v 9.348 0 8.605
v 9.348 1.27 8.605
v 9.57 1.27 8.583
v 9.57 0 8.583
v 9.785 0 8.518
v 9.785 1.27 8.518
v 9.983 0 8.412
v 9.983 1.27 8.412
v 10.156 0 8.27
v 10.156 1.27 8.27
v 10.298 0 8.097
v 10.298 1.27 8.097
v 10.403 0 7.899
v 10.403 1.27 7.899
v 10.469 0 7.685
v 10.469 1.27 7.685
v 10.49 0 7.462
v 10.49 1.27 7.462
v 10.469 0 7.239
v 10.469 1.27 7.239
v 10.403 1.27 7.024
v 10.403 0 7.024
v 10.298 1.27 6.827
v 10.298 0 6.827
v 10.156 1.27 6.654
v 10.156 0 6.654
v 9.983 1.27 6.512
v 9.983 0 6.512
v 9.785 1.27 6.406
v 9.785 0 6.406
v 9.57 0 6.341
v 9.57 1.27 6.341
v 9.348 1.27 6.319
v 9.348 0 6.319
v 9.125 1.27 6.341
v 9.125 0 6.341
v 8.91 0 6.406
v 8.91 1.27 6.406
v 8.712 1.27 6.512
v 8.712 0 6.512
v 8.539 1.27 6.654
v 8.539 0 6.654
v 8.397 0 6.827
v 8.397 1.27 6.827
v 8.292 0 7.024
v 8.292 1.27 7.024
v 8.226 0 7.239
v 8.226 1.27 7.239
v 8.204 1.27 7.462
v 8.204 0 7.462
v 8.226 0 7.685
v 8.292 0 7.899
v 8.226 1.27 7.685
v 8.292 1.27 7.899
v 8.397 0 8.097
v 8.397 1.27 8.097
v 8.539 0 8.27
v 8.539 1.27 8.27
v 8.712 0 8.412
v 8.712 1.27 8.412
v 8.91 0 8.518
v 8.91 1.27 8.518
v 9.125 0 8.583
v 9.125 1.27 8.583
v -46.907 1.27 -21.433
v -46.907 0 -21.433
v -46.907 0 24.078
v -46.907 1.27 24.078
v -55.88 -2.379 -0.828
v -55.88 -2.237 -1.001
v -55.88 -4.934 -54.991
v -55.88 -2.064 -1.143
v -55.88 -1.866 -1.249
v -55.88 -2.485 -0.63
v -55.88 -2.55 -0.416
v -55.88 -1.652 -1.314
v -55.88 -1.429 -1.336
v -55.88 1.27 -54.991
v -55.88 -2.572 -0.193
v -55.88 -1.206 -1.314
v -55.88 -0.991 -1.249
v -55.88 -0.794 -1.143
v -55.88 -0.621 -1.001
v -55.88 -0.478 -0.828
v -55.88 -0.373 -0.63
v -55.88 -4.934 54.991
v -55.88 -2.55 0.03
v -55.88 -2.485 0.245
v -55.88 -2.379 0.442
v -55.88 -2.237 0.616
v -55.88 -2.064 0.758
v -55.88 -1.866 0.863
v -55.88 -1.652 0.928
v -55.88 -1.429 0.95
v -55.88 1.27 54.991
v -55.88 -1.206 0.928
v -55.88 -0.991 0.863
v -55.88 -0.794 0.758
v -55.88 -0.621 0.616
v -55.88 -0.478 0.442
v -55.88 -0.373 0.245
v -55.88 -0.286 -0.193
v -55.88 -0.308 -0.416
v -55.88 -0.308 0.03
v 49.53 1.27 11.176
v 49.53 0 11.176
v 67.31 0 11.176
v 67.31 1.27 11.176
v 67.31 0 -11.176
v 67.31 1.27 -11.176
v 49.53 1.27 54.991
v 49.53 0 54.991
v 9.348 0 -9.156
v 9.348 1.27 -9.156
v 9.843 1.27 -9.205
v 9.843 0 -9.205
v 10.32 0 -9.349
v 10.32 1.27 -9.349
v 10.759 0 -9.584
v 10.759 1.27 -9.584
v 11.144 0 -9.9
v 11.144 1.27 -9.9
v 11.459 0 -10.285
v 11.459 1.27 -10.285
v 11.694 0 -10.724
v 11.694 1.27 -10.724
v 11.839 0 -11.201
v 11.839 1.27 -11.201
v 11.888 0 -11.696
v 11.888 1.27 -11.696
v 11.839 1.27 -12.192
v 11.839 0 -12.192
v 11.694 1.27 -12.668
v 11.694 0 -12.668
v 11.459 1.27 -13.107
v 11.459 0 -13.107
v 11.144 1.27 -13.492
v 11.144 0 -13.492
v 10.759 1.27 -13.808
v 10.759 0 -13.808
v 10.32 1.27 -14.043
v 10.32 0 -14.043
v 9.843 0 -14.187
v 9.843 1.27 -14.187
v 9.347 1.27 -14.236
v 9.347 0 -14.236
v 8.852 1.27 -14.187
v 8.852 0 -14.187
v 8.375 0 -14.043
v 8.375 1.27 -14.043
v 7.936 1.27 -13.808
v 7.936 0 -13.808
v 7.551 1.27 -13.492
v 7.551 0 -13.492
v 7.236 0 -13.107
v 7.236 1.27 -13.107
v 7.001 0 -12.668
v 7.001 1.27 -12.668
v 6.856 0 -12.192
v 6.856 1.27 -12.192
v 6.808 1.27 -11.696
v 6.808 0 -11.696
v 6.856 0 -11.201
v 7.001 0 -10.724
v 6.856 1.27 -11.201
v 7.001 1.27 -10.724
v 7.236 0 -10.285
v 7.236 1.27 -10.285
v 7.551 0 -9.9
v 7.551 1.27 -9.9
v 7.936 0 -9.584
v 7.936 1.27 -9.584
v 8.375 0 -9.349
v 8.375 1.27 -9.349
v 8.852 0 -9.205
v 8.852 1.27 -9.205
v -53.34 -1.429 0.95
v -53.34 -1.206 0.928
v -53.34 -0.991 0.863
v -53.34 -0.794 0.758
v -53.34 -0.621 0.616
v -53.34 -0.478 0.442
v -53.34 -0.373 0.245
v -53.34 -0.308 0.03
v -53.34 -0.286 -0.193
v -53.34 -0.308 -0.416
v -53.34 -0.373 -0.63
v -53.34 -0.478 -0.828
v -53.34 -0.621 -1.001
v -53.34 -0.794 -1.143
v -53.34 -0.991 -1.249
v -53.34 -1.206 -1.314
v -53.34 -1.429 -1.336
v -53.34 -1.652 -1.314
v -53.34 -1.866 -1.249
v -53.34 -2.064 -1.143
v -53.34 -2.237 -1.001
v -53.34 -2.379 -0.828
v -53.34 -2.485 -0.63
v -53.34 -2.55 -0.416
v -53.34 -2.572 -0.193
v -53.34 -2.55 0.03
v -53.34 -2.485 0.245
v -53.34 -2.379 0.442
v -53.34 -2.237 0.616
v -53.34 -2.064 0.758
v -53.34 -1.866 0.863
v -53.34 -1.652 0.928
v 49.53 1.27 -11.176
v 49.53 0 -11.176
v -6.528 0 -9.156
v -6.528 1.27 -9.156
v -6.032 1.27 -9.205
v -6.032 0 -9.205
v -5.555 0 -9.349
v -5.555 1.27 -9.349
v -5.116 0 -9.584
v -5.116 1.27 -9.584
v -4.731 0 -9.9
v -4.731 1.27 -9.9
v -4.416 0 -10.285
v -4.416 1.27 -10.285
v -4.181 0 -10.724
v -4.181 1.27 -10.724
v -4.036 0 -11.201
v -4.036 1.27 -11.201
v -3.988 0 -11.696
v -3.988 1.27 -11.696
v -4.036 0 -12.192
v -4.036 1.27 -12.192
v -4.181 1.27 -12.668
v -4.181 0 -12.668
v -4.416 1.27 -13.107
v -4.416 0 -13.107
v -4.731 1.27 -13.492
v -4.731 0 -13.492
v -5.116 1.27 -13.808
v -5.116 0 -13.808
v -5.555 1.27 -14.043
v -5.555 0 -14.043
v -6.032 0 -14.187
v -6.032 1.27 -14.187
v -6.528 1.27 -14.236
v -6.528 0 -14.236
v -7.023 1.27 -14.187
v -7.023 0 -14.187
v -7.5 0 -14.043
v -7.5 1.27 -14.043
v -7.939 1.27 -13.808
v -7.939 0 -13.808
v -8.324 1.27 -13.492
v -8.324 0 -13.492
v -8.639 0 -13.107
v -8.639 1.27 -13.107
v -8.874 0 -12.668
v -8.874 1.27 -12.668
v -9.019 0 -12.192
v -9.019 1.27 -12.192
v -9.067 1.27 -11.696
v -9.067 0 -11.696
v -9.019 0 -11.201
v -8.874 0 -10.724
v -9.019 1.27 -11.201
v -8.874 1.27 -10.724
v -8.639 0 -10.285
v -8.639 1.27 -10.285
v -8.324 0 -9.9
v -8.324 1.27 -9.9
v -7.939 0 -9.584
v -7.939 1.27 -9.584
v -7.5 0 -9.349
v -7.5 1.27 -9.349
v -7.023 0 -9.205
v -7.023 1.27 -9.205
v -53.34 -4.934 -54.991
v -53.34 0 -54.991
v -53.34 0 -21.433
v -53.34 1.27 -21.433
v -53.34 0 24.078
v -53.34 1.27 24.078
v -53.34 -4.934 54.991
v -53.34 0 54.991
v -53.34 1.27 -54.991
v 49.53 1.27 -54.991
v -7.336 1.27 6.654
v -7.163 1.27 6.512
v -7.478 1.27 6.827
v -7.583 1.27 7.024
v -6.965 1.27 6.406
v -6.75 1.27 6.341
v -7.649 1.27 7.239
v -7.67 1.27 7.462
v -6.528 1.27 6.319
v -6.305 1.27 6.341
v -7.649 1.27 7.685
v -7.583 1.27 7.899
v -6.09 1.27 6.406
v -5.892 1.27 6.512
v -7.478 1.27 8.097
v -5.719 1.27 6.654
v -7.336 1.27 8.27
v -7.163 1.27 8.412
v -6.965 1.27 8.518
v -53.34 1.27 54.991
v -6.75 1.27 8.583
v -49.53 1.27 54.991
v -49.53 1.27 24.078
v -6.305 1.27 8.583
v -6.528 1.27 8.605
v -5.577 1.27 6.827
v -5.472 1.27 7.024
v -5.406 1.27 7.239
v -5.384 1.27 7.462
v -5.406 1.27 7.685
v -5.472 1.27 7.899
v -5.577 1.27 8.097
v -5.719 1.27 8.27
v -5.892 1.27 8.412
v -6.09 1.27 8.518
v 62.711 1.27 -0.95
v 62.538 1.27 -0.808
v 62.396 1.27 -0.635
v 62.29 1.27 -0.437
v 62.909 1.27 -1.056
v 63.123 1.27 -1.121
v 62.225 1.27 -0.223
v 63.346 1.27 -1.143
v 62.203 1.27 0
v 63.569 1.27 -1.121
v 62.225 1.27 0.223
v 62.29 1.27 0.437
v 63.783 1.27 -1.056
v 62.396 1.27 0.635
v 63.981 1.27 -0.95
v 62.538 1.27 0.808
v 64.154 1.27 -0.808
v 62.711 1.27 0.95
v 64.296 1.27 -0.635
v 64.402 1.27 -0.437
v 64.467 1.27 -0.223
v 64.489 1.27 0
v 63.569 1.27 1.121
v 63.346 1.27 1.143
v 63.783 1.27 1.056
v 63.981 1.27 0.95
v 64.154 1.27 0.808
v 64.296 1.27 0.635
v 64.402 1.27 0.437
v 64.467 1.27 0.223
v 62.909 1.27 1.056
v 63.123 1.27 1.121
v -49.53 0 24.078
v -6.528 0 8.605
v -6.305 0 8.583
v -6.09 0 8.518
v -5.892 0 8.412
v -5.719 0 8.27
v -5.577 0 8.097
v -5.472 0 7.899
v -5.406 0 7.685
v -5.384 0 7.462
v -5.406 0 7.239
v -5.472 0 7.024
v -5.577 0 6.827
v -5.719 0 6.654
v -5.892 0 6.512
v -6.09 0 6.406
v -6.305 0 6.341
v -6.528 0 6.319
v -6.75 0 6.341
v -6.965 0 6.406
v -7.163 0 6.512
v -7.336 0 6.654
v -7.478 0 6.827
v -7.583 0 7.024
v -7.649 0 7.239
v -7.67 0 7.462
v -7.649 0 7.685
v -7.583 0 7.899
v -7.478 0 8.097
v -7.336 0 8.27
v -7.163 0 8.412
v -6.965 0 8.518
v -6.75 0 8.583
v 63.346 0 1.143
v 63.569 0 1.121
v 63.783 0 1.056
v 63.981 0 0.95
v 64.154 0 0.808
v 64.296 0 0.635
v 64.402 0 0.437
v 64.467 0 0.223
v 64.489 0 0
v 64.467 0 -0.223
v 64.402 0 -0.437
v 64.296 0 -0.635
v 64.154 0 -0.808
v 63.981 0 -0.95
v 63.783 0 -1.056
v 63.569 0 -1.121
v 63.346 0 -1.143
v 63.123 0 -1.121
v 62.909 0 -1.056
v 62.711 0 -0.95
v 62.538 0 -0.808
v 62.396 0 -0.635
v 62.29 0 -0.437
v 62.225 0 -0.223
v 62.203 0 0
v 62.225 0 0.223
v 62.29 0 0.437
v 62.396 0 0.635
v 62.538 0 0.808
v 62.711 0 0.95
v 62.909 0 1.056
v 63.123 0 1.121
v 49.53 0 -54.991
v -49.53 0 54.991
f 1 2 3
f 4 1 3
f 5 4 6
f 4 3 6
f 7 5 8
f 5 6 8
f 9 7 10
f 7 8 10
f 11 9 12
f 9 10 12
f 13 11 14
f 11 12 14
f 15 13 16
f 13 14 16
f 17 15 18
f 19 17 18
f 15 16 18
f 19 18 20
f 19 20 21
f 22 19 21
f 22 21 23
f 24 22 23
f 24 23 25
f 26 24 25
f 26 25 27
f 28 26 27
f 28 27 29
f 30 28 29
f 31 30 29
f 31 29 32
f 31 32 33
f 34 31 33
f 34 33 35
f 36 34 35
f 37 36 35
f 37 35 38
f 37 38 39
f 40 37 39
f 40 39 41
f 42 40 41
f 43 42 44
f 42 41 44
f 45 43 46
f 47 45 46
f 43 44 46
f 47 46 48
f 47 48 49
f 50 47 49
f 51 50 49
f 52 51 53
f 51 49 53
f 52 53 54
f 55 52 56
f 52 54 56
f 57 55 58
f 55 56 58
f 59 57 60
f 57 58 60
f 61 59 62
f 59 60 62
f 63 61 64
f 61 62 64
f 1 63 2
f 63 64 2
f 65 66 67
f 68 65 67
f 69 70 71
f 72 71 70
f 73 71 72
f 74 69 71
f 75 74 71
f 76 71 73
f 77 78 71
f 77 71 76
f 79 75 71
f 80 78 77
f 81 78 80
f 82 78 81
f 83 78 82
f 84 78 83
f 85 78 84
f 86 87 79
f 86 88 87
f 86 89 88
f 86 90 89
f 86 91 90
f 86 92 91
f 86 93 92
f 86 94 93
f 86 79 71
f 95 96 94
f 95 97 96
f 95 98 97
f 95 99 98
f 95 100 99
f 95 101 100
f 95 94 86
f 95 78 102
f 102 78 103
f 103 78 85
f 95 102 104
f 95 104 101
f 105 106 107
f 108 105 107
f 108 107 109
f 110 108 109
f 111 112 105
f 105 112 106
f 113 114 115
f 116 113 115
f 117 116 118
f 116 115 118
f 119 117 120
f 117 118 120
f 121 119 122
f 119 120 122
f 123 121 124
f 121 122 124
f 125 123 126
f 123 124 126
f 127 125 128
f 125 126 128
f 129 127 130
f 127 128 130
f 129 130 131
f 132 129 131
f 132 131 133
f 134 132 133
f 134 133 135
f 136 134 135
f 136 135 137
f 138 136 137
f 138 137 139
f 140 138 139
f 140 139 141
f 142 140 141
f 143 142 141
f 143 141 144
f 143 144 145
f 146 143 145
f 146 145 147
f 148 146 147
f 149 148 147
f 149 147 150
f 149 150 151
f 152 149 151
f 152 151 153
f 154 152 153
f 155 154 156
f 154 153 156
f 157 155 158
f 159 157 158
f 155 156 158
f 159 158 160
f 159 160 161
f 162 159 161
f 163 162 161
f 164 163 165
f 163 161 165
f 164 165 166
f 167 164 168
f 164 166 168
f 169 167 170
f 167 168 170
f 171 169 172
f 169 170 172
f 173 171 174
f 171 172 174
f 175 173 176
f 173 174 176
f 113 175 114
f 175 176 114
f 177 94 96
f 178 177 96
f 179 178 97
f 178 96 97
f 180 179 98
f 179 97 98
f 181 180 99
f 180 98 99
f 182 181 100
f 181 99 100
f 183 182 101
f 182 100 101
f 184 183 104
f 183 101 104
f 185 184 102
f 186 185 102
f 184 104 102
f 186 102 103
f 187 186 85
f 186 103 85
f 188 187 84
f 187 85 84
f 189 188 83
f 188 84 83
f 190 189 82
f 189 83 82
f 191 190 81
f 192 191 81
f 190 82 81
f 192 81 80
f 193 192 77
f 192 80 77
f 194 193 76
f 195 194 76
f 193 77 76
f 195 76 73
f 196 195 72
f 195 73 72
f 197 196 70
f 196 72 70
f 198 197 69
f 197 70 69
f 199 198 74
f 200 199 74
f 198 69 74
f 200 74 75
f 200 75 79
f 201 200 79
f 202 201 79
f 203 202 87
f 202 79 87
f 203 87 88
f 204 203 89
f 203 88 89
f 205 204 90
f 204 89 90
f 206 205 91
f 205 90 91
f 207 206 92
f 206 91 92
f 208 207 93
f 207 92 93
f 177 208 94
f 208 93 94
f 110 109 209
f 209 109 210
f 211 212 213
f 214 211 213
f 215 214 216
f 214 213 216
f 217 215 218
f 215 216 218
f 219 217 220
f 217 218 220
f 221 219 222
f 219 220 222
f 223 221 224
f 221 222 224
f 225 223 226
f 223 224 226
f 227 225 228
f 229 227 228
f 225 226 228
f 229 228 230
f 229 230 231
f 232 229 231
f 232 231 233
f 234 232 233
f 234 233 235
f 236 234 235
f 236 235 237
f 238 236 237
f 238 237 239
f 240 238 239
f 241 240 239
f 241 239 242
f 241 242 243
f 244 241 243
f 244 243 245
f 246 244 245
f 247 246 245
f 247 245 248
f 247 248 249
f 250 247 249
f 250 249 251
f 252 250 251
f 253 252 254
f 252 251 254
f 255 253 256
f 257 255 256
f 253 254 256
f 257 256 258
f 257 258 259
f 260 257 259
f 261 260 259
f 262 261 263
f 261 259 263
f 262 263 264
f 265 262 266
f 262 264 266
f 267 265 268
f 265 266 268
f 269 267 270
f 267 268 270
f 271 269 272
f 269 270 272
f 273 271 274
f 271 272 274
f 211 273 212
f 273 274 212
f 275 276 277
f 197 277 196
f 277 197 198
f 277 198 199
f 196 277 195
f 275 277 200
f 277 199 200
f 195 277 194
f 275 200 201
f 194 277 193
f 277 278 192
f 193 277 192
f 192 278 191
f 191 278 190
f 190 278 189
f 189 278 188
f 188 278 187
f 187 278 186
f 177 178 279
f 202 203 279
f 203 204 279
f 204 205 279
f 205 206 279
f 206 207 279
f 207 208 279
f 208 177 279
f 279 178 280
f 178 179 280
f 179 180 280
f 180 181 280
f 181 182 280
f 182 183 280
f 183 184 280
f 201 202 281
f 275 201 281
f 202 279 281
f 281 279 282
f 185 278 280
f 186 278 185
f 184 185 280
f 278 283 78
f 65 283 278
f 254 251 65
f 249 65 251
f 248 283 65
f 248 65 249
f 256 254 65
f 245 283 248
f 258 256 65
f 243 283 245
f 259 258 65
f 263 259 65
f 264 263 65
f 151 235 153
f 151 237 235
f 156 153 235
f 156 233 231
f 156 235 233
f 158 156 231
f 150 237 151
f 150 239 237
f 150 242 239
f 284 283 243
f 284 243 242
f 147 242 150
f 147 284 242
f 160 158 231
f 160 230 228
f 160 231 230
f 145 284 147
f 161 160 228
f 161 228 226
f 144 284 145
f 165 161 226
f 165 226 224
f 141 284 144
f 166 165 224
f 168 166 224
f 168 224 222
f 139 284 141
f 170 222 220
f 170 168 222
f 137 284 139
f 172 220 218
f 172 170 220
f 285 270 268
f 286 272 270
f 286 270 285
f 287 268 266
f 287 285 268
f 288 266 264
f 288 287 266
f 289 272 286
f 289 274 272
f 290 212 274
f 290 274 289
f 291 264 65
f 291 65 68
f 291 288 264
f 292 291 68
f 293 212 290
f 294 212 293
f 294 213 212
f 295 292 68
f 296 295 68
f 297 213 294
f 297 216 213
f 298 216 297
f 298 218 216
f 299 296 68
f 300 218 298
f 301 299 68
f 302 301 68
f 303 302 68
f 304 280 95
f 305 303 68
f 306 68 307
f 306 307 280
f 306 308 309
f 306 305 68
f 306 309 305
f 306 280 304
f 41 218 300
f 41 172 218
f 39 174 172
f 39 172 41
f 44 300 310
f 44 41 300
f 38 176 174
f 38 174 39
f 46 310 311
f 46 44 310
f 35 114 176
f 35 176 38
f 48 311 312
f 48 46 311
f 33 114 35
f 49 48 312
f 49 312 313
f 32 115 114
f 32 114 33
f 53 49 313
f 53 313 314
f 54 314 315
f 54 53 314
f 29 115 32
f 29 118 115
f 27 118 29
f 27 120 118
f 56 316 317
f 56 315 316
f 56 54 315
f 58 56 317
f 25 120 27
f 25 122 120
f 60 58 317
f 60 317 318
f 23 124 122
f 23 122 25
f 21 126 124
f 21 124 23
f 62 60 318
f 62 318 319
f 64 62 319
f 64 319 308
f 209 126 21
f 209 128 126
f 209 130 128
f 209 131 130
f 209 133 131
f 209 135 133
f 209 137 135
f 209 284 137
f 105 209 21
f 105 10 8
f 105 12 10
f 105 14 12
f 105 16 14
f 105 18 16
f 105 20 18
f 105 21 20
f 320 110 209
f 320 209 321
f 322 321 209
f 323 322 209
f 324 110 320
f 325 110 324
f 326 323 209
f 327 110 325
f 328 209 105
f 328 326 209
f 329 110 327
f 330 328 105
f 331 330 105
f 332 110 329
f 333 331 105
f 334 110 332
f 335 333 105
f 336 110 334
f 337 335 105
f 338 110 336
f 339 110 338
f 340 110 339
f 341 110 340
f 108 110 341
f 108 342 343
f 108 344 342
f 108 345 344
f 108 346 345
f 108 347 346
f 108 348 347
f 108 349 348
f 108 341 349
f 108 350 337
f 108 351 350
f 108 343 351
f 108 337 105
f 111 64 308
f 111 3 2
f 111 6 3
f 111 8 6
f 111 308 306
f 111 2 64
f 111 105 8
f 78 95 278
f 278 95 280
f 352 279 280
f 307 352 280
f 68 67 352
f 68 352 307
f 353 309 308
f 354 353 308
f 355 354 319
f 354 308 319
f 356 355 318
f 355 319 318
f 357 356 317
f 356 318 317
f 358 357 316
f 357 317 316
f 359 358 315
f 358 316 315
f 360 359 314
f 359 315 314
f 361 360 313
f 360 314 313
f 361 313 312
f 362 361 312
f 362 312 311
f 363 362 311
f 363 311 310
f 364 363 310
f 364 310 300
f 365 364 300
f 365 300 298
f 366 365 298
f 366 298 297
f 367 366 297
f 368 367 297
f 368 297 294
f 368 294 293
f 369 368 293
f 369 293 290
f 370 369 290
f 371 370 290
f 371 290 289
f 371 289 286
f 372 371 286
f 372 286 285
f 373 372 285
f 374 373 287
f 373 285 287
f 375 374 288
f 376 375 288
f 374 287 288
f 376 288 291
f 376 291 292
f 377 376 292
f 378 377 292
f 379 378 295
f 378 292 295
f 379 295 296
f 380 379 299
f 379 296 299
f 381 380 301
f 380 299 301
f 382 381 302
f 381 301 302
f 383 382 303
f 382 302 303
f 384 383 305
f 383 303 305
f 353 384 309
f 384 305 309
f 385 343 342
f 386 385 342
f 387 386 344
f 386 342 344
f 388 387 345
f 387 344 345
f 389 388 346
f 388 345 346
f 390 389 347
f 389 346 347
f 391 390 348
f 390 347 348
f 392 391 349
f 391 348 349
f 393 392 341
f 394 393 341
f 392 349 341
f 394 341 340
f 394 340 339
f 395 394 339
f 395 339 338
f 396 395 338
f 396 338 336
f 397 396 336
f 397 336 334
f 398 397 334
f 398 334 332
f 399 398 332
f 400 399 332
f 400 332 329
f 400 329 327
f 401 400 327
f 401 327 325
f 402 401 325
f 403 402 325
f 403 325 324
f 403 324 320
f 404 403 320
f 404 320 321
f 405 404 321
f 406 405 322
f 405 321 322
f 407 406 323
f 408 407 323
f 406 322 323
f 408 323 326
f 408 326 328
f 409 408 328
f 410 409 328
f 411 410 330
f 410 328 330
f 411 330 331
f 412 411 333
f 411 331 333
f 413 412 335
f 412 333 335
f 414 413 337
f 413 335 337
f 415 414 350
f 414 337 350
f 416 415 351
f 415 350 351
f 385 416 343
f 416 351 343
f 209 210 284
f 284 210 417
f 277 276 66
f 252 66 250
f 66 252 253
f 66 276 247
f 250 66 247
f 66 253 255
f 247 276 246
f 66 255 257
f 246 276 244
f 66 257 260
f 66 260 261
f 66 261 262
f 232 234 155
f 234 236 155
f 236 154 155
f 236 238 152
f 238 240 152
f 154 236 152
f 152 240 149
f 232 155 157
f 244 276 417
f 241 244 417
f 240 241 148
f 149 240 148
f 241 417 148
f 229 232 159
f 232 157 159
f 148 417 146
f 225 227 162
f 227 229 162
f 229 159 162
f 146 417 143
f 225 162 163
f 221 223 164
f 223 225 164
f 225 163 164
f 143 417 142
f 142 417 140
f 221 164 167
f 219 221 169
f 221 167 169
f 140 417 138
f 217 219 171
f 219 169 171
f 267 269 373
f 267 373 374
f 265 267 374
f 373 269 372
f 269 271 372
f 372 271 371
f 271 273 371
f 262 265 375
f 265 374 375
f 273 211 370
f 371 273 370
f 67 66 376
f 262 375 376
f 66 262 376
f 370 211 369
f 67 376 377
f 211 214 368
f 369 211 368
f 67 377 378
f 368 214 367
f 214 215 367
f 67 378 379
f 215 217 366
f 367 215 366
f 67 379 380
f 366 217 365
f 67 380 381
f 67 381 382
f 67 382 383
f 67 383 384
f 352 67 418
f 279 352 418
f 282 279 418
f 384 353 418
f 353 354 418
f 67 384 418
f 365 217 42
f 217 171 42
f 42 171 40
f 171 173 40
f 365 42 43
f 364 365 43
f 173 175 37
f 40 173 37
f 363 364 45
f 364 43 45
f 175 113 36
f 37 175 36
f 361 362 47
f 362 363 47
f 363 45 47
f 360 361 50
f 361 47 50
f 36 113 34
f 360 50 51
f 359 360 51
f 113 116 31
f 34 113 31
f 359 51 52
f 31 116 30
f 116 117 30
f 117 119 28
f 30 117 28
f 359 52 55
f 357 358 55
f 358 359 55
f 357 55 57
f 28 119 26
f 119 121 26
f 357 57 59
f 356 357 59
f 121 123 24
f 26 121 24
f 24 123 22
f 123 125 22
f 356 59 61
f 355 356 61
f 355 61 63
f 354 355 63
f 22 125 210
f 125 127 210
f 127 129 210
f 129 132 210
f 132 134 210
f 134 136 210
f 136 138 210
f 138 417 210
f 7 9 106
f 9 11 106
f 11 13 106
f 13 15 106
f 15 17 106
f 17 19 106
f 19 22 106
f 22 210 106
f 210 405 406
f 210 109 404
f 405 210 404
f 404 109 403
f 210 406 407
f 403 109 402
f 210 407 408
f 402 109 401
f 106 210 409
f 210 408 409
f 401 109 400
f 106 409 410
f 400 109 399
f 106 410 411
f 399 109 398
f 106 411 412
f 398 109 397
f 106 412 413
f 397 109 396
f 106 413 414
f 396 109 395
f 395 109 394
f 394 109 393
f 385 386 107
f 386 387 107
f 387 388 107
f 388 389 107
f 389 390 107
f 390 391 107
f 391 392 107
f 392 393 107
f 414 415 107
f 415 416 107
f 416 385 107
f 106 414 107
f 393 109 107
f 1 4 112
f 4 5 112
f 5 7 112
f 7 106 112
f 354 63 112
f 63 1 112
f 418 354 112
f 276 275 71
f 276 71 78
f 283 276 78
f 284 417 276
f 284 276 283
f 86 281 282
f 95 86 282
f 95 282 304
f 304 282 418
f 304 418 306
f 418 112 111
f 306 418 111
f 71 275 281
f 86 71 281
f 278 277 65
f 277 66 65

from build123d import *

# Parameters (mm, degrees)
BOSS_EXTRUDE1_DEPTH = 1.27
SKETCH2_R           = 1.143
CUT_EXTRUDE2_DEPTH  = 2.54
SKETCH3_R           = 2.54
SKETCH3_R_2         = 1.143
CUT_EXTRUDE3_DEPTH  = 2.54
SKETCH19_W          = 30.913141625
SKETCH19_H          = 1.27
BOSS_EXTRUDE2_DEPTH = 3.81
SKETCH20_W          = 33.557604238
SKETCH20_H          = 1.27
BOSS_EXTRUDE3_DEPTH = 3.81
SKETCH21_W          = 109.982
SKETCH21_H          = 6.204110365
BOSS_EXTRUDE4_DEPTH = 2.54
SKETCH22_R          = 1.143
CUT_EXTRUDE6_DEPTH  = 2.54


with BuildPart() as part:
    # Sketch1 → Boss-Extrude1 (new body)
    with BuildSketch(Plane(origin=(0, 0, 0), x_dir=(1, 0, 0), z_dir=(0, 1, 0))):
        Polygon((49.53, -54.991), (49.53, -11.176), (67.31, -11.176), (67.31, 11.176), (49.53, 11.176), (49.53, 54.991), (-49.53, 54.991), (-49.53, 21.433395762), (-46.907297859, 21.433395762), (-46.907297859, -24.077858375), (-49.53, -24.077858375), (-49.53, -54.991), align=None)
    extrude(amount=BOSS_EXTRUDE1_DEPTH)

    # Sketch2 → Cut-Extrude2 (cut)
    with BuildSketch(Plane(origin=(0, 1.27, 0), x_dir=(1, 0, 0), z_dir=(0, 1, 0))):
        with Locations(Location((63.345949026, 0, 0), (0, 0, 270))):
            Circle(SKETCH2_R)
    extrude(amount=-CUT_EXTRUDE2_DEPTH, mode=Mode.SUBTRACT)

    # Sketch3 → Cut-Extrude3 (cut)
    with BuildSketch(Plane(origin=(0, 1.27, 0), x_dir=(1, 0, 0), z_dir=(0, 1, 0))):
        with Locations(Location((-6.5275, 11.696076054, 0), (0, 0, 270))):
            Circle(SKETCH3_R)
        with Locations(Location((9.3475, 11.696076054, 0), (0, 0, 270))):
            Circle(SKETCH3_R)
        with Locations(Location((-6.5275, -7.461873946, 0), (0, 0, 270))):
            Circle(SKETCH3_R_2)
        with Locations(Location((9.3475, -7.461873946, 0), (0, 0, 270))):
            Circle(SKETCH3_R_2)
    extrude(amount=-CUT_EXTRUDE3_DEPTH, mode=Mode.SUBTRACT)

    # Sketch19 → Boss-Extrude2 (add)
    with BuildSketch(Plane.ZY.offset(49.53)):
        with Locations((39.534429188, 0.635)):
            Rectangle(SKETCH19_W, SKETCH19_H)
    extrude(amount=BOSS_EXTRUDE2_DEPTH)

    # Sketch20 → Boss-Extrude3 (add)
    with BuildSketch(Plane.ZY.offset(49.53)):
        with Locations((-38.212197881, 0.635)):
            Rectangle(SKETCH20_W, SKETCH20_H)
    extrude(amount=BOSS_EXTRUDE3_DEPTH)

    # Sketch21 → Boss-Extrude4 (add)
    with BuildSketch(Plane.ZY.offset(53.34)):
        with Locations((0, -1.832055183)):
            Rectangle(SKETCH21_W, SKETCH21_H)
    extrude(amount=BOSS_EXTRUDE4_DEPTH)

    # Sketch22 → Cut-Extrude6 (cut)
    with BuildSketch(Plane.ZY.offset(55.88)):
        with Locations((-0.192674888, -1.428814134)):
            Circle(SKETCH22_R)
    extrude(amount=-CUT_EXTRUDE6_DEPTH, mode=Mode.SUBTRACT)


solid = part.part
